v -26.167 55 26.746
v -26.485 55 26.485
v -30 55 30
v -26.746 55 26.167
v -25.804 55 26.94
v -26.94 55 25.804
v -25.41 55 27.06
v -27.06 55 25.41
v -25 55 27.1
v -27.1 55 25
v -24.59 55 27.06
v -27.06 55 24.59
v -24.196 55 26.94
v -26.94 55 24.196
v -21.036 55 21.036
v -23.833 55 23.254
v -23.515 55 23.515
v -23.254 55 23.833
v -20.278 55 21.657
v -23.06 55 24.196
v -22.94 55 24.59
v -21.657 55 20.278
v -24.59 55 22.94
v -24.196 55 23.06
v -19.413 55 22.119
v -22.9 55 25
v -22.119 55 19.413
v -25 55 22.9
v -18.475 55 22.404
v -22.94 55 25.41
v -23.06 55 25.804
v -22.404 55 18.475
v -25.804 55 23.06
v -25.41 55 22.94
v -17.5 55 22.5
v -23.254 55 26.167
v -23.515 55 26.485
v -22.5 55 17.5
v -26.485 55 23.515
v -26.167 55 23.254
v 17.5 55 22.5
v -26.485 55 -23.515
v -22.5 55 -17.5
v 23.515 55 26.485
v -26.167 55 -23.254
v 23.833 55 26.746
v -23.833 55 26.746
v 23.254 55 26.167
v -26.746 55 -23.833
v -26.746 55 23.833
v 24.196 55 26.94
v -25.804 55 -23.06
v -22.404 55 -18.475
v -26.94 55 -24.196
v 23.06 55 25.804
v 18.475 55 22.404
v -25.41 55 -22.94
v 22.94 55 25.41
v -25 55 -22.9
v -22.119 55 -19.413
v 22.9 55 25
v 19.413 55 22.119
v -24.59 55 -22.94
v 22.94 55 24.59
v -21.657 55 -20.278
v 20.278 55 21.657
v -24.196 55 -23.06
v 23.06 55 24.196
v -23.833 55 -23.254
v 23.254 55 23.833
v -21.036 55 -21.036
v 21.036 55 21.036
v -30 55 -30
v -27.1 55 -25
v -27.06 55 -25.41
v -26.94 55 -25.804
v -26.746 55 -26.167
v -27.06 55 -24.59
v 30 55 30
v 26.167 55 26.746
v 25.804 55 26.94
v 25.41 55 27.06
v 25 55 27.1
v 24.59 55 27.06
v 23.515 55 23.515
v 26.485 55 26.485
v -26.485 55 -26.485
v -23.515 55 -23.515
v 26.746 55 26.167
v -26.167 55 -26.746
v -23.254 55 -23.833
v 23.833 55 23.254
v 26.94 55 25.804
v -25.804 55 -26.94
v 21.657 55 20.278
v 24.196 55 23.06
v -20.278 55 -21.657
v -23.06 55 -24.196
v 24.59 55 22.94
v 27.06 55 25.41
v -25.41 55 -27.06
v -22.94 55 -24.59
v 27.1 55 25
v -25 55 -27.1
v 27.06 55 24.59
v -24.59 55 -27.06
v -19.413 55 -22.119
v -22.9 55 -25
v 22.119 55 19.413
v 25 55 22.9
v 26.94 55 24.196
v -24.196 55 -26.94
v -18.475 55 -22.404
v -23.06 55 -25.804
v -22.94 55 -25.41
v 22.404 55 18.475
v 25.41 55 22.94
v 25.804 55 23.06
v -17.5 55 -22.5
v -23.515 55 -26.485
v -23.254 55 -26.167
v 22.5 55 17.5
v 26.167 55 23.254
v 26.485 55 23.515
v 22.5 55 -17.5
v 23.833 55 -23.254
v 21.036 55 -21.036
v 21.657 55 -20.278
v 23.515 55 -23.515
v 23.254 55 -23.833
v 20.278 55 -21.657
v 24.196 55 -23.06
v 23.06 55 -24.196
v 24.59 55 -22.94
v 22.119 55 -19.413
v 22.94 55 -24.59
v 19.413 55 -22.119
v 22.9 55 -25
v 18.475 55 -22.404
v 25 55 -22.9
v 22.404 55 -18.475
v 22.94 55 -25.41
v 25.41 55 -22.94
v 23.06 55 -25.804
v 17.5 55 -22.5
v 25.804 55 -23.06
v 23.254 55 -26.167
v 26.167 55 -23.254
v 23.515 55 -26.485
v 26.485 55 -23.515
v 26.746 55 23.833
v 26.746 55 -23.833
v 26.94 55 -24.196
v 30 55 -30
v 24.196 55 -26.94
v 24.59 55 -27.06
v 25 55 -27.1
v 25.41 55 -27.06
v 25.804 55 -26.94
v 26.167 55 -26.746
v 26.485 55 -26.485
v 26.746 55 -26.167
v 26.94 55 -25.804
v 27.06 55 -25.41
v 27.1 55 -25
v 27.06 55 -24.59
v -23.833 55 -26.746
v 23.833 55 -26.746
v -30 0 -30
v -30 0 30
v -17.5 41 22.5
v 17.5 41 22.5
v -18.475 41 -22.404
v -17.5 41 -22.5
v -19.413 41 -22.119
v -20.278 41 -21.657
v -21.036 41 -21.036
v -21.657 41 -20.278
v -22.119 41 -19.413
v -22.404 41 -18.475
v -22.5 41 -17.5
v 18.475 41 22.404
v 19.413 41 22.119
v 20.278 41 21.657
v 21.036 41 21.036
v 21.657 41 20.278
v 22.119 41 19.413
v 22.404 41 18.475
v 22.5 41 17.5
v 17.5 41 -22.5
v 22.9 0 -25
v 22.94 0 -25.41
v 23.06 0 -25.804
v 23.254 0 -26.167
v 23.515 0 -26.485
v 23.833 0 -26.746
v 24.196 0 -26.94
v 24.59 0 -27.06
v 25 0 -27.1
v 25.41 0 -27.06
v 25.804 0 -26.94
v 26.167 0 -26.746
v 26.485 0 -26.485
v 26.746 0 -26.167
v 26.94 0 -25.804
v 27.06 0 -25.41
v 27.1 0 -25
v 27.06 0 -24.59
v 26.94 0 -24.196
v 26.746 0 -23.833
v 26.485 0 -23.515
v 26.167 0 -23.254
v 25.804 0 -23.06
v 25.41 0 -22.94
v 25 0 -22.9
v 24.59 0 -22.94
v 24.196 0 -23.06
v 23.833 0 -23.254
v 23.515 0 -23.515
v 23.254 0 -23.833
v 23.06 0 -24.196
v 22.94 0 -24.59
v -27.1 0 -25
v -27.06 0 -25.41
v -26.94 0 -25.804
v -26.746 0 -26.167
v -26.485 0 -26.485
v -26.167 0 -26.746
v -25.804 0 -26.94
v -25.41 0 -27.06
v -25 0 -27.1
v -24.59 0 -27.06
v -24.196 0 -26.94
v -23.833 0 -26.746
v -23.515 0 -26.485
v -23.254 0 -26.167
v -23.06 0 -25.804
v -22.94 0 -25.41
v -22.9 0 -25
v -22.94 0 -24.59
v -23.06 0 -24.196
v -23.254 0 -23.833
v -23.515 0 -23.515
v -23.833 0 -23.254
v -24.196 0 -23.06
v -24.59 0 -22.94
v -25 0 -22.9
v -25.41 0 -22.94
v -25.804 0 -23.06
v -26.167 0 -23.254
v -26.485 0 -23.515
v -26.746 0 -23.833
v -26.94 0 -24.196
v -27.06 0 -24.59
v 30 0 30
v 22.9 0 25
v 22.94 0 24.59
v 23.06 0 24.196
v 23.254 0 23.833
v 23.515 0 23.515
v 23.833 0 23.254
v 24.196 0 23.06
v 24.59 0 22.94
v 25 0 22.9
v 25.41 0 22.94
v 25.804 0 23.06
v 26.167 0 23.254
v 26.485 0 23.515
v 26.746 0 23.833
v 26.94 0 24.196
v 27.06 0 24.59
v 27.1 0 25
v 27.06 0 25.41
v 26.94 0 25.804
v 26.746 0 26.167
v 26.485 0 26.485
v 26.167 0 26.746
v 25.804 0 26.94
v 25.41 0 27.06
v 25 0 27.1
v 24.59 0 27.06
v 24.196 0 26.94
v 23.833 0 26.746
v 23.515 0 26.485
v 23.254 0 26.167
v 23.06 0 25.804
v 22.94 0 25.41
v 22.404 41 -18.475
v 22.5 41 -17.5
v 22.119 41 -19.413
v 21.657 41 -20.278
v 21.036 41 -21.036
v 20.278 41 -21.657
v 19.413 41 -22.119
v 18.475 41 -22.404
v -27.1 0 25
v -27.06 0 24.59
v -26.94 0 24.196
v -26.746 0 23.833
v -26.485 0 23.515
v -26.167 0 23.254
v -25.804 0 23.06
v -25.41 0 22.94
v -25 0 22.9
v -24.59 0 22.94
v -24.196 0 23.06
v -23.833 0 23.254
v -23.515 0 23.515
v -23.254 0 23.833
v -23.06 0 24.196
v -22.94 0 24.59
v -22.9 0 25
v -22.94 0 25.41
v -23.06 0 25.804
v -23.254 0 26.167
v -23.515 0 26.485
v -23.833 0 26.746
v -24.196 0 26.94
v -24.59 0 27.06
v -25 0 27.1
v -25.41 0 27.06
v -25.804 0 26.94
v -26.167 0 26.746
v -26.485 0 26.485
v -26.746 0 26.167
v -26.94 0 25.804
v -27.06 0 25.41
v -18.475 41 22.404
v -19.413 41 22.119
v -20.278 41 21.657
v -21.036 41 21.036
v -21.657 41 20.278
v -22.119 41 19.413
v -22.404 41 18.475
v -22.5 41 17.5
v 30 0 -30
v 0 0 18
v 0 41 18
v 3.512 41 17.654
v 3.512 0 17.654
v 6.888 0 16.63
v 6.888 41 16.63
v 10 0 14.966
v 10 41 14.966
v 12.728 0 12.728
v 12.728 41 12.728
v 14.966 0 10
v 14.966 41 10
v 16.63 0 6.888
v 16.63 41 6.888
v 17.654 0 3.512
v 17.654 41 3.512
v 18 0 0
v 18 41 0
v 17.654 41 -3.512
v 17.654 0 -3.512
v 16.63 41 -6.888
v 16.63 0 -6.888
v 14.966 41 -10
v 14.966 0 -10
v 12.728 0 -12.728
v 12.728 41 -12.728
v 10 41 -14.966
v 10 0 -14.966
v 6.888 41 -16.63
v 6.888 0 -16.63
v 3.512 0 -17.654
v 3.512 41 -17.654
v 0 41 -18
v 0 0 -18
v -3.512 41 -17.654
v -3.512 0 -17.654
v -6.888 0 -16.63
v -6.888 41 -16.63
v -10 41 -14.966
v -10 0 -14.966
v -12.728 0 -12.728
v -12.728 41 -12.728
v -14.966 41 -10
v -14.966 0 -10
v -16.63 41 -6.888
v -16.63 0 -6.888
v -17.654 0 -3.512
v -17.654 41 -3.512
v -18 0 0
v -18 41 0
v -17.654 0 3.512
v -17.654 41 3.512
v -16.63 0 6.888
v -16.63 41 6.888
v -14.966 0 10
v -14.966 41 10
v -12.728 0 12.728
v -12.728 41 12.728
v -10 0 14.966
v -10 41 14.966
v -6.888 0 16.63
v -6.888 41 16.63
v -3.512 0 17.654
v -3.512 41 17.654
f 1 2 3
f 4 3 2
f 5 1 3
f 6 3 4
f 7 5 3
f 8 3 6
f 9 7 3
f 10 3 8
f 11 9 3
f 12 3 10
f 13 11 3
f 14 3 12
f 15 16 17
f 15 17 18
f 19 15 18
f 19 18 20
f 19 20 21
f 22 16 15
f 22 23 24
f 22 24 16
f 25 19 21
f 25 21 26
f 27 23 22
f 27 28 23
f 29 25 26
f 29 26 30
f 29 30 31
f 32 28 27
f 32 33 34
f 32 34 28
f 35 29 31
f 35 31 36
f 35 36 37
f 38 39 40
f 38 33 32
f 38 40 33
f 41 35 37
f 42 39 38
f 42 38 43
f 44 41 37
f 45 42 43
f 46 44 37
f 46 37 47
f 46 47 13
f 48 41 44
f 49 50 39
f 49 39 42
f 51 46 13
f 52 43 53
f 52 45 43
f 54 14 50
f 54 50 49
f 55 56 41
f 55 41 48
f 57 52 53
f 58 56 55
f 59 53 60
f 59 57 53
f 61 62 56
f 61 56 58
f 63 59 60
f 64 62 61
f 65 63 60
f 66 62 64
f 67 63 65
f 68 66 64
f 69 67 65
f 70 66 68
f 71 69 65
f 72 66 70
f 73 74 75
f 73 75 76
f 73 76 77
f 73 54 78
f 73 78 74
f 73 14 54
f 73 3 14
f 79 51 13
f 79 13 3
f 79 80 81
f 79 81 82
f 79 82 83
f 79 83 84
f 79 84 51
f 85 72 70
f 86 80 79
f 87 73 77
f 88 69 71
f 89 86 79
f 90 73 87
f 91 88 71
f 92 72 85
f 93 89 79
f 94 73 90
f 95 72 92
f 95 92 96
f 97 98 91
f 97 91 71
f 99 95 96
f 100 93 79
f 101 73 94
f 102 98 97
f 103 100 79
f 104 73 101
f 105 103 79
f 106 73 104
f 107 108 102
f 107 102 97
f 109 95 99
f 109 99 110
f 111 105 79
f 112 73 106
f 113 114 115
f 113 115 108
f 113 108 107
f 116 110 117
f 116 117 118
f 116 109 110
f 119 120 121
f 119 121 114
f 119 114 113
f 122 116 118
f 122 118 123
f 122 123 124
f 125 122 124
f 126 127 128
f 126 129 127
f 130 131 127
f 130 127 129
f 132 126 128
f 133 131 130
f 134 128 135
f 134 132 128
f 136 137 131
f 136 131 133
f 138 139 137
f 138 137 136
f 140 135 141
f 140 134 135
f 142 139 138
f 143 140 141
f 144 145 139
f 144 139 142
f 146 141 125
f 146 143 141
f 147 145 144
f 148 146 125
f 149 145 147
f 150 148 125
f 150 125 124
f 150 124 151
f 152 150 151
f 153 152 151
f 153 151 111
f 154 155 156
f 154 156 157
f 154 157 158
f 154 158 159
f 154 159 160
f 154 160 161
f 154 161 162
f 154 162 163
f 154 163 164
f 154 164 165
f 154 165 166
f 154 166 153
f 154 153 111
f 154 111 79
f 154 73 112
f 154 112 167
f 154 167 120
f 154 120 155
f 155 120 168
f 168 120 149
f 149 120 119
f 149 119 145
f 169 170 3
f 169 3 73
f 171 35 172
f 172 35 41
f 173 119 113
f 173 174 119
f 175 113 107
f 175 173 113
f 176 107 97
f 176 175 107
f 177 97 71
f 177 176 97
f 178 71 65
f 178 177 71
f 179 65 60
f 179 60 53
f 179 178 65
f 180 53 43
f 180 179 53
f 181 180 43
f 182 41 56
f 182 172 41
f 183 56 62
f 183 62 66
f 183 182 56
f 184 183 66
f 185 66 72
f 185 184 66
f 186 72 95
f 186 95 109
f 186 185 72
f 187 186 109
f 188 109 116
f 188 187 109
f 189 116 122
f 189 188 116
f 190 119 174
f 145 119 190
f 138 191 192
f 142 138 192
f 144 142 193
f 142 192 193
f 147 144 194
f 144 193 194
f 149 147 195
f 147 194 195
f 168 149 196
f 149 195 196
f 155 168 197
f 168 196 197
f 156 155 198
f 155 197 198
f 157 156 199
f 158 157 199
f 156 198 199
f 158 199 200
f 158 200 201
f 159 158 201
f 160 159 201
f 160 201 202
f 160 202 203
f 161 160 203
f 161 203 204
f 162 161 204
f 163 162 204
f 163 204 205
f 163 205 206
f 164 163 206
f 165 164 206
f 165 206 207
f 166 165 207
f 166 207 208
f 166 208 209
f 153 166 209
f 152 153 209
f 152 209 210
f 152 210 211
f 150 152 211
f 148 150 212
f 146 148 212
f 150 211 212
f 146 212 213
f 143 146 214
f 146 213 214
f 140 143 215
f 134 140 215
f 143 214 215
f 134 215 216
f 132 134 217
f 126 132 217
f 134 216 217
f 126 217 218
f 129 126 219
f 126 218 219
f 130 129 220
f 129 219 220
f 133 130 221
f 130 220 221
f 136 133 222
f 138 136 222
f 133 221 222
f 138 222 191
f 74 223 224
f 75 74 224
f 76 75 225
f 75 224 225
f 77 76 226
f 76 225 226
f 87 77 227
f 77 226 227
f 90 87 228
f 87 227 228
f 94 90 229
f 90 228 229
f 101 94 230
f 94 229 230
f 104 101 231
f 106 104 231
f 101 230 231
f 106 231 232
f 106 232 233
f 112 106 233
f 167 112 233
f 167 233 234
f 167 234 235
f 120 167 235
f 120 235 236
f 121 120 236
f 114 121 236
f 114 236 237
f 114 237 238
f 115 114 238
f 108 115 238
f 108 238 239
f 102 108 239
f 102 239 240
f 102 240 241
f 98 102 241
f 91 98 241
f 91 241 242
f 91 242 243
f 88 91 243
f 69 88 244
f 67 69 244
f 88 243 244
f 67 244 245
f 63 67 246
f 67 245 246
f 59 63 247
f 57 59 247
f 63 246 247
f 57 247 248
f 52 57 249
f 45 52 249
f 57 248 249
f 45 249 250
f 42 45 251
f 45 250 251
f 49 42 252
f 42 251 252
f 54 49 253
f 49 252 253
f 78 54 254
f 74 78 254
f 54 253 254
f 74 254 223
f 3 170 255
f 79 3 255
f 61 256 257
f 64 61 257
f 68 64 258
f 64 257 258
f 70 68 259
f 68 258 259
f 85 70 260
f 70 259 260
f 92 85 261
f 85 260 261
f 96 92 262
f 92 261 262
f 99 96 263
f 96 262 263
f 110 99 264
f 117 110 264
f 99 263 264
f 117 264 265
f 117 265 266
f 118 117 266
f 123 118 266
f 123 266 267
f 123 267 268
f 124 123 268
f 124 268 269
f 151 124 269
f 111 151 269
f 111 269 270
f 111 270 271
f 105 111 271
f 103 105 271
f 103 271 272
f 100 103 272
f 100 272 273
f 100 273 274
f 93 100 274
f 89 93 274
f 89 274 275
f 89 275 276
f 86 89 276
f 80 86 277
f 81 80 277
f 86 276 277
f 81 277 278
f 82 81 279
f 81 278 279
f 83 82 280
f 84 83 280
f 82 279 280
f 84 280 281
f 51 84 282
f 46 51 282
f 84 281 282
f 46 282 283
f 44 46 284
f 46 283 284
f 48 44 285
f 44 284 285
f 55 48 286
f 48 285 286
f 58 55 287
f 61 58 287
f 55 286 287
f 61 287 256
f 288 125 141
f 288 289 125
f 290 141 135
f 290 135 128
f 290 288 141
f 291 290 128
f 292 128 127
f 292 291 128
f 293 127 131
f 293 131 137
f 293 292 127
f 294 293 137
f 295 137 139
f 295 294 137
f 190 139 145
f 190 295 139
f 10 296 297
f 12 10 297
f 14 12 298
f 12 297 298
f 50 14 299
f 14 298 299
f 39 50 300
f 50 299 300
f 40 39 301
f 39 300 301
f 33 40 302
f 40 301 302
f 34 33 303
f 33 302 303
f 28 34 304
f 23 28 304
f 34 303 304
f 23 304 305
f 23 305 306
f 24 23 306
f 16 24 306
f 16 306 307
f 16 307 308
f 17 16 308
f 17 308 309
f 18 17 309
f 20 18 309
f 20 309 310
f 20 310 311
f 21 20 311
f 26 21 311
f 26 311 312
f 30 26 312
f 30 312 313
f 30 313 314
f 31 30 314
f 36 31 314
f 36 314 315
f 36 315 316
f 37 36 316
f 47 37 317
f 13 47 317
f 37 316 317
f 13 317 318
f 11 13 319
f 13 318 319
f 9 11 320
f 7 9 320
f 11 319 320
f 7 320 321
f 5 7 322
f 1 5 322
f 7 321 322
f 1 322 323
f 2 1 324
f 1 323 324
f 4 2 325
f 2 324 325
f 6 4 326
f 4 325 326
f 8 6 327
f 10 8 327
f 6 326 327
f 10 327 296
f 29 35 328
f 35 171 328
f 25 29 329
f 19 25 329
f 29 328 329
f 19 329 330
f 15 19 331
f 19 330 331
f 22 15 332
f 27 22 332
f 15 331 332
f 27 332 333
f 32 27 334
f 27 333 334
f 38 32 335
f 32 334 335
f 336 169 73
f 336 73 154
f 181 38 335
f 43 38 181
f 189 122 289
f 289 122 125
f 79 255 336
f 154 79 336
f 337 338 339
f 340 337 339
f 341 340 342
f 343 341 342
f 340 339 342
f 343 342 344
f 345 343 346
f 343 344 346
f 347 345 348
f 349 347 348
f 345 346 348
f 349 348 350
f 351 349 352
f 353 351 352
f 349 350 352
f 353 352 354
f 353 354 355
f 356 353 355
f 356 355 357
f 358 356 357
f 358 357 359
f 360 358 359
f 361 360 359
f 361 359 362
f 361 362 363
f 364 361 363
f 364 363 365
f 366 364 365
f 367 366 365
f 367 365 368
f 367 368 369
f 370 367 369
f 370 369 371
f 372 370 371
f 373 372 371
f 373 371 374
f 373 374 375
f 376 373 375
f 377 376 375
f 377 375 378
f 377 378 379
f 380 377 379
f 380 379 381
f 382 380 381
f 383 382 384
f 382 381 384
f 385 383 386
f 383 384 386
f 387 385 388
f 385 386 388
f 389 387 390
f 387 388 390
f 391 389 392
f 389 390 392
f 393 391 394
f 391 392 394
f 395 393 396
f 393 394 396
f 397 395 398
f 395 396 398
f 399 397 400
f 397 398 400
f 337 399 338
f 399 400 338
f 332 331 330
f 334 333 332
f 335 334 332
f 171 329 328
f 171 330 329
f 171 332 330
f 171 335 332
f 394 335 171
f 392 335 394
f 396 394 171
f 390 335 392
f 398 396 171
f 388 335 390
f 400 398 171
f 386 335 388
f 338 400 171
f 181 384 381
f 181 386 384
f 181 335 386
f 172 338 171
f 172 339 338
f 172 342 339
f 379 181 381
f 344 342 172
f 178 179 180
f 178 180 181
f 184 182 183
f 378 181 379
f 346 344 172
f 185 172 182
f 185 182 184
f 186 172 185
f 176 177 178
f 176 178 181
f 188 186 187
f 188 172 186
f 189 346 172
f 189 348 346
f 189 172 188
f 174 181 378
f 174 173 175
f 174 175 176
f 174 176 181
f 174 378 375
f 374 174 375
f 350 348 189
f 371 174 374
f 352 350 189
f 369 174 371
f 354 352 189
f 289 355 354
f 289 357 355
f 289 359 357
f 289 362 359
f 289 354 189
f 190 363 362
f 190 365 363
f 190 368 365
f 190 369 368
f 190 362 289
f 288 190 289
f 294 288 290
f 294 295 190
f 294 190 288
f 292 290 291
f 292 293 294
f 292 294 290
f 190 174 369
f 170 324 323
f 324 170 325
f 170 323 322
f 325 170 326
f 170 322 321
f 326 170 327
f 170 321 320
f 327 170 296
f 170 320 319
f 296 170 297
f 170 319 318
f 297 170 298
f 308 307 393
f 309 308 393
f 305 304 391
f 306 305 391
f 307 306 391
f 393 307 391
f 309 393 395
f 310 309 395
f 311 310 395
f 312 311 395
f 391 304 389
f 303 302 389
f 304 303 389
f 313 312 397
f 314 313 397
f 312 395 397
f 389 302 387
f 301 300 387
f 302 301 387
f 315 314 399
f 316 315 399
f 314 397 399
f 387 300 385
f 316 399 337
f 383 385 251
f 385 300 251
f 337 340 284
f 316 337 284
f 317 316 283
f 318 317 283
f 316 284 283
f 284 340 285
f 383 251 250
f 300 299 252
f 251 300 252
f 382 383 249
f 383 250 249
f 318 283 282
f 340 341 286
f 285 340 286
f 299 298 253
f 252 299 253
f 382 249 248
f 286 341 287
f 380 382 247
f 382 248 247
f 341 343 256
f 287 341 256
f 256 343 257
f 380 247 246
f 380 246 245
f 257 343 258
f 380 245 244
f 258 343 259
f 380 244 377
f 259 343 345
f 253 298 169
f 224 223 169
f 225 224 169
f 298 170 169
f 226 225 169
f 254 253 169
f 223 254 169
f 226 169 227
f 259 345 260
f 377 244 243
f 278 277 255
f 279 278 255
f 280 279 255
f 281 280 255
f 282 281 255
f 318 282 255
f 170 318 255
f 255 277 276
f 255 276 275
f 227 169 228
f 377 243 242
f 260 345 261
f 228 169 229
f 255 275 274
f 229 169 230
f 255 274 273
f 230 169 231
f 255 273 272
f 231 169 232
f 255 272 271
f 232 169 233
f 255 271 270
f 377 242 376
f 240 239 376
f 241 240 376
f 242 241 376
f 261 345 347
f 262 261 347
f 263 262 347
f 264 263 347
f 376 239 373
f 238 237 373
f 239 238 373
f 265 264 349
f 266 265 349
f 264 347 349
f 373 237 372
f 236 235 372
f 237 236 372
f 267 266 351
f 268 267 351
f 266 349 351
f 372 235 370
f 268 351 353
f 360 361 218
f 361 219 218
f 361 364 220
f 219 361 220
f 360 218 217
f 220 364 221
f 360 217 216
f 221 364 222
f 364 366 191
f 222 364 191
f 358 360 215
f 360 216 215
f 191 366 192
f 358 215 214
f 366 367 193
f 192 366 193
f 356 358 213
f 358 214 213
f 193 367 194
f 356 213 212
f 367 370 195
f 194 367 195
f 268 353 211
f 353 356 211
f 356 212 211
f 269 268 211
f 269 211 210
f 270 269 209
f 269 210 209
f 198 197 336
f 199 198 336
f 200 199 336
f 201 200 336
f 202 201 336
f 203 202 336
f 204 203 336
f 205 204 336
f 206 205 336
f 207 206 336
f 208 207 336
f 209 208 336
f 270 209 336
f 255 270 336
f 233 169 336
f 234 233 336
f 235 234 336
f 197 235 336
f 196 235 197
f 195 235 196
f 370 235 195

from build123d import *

# Parameters (mm, degrees)
SKETCH1_W           = 60
SKETCH1_H           = 60
BOSS_EXTRUDE1_DEPTH = 55
SKETCH2_R           = 18
CUT_EXTRUDE1_DEPTH  = 70.462219947
M5_TAPPED_HOLE1_D   = 4.2
SKETCH5_W           = 45
SKETCH5_H           = 45
CUT_EXTRUDE2_DEPTH  = 14
FILLET1_R           = 5


with BuildPart() as part:
    # Sketch1 → Boss-Extrude1 (new body)
    with BuildSketch(Plane(origin=(0, 0, 0), x_dir=(1, 0, 0), z_dir=(0, 1, 0))):
        Rectangle(SKETCH1_W, SKETCH1_H)
    extrude(amount=BOSS_EXTRUDE1_DEPTH)

    # Sketch2 → Cut-Extrude1 (cut, through all)
    with BuildSketch(Plane(origin=(0, 55, 0), x_dir=(1, 0, 0), z_dir=(0, 1, 0))):
        with Locations(Location((0, 0, 0), (0, 0, 270))):
            Circle(SKETCH2_R)
    extrude(amount=-CUT_EXTRUDE1_DEPTH, mode=Mode.SUBTRACT)

    # M5 Tapped Hole1 (through all)
    with Locations(Plane(origin=(0, 55, 0), x_dir=(1, 0, 0), z_dir=(0, 1, 0))):
        with Locations((-25, -25), (-25, 25), (25, 25), (25, -25), (0, 0)):
            Hole(M5_TAPPED_HOLE1_D / 2)

    # Sketch5 → Cut-Extrude2 (cut)
    with BuildSketch(Plane(origin=(0, 55, 0), x_dir=(1, 0, 0), z_dir=(0, 1, 0))):
        Rectangle(SKETCH5_W, SKETCH5_H)
    extrude(amount=-CUT_EXTRUDE2_DEPTH, mode=Mode.SUBTRACT)

    # Fillet1
    fillet1_edges = [part.edges().sort_by_distance(p)[0] for p in [
        (-22.5, 48, 22.5),
        (-22.5, 48, -22.5),
        (22.5, 48, -22.5),
        (22.5, 48, 22.5),
    ]]
    fillet(fillet1_edges, radius=FILLET1_R)


solid = part.part
